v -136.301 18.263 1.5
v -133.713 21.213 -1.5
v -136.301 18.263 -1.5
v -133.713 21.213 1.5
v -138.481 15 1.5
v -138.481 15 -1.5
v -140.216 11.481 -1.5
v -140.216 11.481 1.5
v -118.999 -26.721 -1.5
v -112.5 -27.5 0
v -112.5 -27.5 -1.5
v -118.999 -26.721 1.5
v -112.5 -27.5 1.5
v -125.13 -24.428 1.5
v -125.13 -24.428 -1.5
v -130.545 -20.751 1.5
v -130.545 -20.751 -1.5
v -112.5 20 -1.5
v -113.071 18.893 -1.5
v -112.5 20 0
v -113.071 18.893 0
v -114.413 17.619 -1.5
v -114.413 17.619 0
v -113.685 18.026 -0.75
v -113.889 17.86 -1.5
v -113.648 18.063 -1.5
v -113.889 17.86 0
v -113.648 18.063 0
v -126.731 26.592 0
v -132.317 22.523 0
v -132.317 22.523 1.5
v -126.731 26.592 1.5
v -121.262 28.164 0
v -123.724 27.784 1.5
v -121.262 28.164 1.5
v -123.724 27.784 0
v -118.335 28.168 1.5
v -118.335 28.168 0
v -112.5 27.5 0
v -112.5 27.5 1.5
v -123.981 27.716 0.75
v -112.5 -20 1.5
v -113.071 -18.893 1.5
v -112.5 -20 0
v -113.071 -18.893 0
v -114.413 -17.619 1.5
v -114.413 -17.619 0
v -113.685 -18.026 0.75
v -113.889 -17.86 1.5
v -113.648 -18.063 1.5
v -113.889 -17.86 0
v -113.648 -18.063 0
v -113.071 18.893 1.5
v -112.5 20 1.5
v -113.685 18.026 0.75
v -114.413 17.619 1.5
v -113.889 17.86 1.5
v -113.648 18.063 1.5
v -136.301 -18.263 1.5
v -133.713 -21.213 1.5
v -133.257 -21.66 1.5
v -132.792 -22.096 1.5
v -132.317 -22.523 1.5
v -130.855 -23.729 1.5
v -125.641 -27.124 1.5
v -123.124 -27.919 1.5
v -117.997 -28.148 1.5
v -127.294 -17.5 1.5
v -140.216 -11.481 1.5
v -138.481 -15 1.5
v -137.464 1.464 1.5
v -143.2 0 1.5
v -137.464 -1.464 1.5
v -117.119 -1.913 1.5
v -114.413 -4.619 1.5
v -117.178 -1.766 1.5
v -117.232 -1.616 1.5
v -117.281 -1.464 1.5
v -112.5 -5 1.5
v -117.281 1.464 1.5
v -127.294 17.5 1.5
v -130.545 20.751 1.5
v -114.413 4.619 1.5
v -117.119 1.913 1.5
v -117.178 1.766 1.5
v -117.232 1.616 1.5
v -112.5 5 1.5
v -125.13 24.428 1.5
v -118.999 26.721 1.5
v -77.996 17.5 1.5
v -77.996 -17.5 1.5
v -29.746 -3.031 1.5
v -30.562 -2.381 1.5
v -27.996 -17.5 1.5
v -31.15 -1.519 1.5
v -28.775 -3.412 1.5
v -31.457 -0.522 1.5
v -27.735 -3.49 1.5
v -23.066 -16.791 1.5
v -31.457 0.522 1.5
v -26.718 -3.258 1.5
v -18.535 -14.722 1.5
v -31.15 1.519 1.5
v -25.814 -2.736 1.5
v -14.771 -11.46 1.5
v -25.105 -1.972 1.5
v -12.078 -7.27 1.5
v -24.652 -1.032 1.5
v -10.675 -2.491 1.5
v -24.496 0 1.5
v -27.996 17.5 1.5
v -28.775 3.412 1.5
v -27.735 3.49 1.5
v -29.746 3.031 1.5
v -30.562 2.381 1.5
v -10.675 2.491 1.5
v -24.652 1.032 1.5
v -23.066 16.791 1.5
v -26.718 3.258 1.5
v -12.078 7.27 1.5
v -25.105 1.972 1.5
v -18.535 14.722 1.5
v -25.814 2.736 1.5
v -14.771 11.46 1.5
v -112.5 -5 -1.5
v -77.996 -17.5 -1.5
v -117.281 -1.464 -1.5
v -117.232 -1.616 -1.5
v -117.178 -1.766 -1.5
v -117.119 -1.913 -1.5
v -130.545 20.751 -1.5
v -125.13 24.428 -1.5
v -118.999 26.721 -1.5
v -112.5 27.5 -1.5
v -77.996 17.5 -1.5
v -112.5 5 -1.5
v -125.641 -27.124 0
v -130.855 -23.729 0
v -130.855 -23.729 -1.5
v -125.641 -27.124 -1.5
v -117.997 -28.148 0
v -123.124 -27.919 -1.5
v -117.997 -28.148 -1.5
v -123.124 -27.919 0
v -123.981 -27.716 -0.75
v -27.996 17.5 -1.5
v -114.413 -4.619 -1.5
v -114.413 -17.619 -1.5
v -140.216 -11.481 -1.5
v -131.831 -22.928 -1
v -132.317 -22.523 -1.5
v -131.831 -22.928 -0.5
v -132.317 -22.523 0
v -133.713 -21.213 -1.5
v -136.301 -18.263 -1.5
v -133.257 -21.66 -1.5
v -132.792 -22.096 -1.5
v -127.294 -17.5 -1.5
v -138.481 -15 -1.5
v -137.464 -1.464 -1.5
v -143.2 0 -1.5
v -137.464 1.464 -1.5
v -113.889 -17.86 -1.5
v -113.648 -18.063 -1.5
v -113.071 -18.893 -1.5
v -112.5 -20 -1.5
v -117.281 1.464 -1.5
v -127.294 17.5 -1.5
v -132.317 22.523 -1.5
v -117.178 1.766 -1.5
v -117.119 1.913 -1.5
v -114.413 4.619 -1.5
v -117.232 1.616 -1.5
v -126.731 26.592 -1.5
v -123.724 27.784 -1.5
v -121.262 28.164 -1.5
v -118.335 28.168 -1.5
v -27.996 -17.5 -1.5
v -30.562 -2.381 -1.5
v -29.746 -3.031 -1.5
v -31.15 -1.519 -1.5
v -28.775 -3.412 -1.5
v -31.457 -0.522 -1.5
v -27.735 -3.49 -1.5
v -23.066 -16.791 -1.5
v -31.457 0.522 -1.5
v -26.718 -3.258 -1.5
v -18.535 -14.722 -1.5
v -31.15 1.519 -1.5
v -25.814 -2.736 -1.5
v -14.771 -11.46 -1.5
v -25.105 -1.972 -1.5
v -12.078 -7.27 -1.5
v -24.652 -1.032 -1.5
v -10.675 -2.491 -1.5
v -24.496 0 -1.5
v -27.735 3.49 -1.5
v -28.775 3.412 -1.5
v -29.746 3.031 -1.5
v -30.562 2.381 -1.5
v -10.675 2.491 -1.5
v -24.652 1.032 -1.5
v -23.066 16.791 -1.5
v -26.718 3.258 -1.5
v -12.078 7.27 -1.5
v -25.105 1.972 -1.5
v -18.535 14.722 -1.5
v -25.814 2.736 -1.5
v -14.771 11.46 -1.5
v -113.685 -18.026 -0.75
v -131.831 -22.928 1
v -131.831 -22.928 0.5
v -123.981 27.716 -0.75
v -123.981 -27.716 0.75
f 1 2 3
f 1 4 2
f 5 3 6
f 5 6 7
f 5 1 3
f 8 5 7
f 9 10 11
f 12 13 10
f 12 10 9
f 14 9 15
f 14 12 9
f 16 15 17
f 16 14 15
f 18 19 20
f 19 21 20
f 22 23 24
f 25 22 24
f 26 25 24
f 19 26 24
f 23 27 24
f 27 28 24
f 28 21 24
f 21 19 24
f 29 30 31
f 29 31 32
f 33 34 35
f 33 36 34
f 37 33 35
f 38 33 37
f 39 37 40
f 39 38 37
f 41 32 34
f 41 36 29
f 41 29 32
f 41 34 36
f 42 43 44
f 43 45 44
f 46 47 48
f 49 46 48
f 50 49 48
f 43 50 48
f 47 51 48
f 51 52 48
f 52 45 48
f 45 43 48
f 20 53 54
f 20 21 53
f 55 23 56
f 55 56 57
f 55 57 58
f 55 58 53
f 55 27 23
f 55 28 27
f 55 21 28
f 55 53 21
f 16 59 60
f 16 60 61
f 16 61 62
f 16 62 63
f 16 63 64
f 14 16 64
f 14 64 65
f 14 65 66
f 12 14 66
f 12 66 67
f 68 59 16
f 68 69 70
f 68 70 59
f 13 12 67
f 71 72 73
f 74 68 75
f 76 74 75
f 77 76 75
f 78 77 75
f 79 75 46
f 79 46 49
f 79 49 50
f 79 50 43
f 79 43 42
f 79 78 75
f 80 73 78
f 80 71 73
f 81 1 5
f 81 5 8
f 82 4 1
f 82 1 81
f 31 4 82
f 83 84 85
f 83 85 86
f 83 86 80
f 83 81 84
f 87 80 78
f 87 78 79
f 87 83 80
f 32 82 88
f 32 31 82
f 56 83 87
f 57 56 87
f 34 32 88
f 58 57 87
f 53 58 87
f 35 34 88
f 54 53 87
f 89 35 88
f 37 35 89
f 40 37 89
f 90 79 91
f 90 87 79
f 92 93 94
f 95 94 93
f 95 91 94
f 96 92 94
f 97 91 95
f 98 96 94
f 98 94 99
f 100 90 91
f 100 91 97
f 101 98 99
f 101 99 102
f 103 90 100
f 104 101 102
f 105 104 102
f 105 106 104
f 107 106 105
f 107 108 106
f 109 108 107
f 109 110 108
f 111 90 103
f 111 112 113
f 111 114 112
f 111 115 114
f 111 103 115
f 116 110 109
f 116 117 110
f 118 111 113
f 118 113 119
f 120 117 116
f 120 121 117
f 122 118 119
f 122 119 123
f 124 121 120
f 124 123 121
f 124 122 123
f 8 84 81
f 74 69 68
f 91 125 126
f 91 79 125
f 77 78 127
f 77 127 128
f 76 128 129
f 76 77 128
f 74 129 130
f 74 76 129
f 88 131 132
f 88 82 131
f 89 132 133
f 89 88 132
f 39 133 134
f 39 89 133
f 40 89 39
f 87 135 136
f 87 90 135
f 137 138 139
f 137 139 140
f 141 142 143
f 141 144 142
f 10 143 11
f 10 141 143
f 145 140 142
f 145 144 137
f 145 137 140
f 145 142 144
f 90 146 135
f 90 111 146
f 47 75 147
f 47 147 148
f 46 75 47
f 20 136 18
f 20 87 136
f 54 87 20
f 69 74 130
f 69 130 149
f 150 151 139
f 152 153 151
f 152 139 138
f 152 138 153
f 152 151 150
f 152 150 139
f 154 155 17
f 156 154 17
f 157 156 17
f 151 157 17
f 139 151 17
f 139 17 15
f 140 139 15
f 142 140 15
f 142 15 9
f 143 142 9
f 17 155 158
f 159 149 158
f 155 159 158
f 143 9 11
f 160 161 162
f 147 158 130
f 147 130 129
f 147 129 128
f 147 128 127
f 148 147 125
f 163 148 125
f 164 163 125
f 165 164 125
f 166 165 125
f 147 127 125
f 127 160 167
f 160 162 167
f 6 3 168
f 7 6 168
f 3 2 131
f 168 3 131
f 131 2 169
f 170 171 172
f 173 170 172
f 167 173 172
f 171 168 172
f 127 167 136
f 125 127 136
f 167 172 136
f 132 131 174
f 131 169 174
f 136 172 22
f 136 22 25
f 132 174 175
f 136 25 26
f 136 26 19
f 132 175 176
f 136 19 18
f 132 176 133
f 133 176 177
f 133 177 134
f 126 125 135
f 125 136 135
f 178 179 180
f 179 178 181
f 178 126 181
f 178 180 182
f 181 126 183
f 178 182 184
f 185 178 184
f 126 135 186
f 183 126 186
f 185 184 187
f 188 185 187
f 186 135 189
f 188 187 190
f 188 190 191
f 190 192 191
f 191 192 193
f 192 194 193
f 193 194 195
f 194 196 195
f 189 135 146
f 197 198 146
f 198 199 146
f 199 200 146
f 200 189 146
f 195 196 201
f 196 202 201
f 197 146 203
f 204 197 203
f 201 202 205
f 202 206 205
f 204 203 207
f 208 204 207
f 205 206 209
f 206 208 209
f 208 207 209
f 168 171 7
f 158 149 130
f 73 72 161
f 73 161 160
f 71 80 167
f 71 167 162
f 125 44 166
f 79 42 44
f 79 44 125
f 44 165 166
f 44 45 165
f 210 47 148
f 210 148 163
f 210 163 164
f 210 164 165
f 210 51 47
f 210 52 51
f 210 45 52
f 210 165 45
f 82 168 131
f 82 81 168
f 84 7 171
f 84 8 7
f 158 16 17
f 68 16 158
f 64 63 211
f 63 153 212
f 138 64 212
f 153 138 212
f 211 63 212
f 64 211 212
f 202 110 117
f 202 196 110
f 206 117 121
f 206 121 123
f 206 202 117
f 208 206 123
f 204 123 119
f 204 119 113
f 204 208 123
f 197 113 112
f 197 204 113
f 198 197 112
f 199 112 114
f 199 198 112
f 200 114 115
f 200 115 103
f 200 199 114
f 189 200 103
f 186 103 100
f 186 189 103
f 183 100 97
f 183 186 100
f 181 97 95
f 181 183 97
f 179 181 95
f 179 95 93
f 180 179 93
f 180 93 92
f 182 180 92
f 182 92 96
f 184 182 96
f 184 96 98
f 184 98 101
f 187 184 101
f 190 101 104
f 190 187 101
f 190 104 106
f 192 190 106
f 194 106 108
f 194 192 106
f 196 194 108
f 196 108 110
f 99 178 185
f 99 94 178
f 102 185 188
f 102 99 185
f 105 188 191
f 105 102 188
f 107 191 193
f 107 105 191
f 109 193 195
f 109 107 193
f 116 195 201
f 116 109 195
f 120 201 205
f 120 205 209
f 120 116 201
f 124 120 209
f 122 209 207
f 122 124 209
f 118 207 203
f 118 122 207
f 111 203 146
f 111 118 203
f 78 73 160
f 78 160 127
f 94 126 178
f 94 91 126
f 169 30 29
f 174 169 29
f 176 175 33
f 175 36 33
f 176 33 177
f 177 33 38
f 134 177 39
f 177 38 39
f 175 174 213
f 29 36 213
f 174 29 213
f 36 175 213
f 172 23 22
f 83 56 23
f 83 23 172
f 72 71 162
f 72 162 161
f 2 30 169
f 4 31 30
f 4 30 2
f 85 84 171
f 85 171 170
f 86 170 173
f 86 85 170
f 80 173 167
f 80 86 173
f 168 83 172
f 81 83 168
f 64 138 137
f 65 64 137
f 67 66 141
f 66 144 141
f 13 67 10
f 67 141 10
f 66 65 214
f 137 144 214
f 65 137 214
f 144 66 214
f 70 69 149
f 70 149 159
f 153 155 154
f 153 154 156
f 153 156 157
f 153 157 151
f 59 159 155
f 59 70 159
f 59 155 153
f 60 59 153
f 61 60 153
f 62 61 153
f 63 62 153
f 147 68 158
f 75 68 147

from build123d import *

# Parameters (mm, degrees)
F0_R     = 3.5
F1_DEPTH = 1.5


# Not quite as in the source:
# - a feature names something its author has since deleted; it is built from what else it names


with BuildPart() as f1:
    # F0 (on Top) → F1 (new body, symmetric)
    with BuildSketch(Plane.XY):
        with BuildLine():
            Line((-140.2163859753, 11.480502971), (-117.1193976626, 1.9134171618))
            ThreePointArc((-117.1193976626, 1.9134171618), (-117.2054191616, 1.6908667936), (-117.2807257879, 1.4644660941))
            Line((-117.2807257879, 1.4644660941), (-135.5639451435, 1.4644660941))
            Line((-135.5639451435, 1.4644660941), (-137.4212426417, 1.4644660941))
            Line((-137.4212426417, 1.4644660941), (-137.4642343313, 1.4644660941))
            Line((-137.4642343313, 1.4644660941), (-143.2, 0))
            Line((-143.2, 0), (-137.4642343313, -1.4644660941))
            Line((-137.4642343313, -1.4644660941), (-137.4212426417, -1.4644660941))
            Line((-137.4212426417, -1.4644660941), (-135.5639451435, -1.4644660941))
            Line((-135.5639451435, -1.4644660941), (-117.2807257879, -1.4644660941))
            ThreePointArc((-117.2807257879, -1.4644660941), (-117.2054191616, -1.6908667936), (-117.1193976626, -1.9134171618))
            Line((-117.1193976626, -1.9134171618), (-140.2163859753, -11.480502971))
            ThreePointArc((-140.2163859753, -11.480502971), (-137.4440883691, -16.6671069906), (-133.7132034356, -21.2132034356))
            ThreePointArc((-133.7132034356, -21.2132034356), (-133.0255631487, -21.8792426155), (-132.3170219693, -22.5230024701))
            add(Edge.make_bspline(
                [(-132.3170219693, -22.5230024701), (-131.8310141521, -22.9279318204), (-131.3450063349, -23.3328611708), (-130.8554027807, -23.7292896809)],
                knots=[0, 0, 0, 0, 0.0899480821, 0.0899480821, 0.0899480821, 0.0899480821], degree=3))
            add(Edge.make_bspline(
                [(-130.8554027807, -23.7292896809), (-128.7296529668, -25.4504941622), (-123.6181233569, -29.0879440293), (-116.5404183436, -28.0770720452), (-112.5, -27.5)],
                knots=[0.0899480821, 0.0899480821, 0.0899480821, 0.0899480821, 0.4804826627, 1, 1, 1, 1], degree=3))
            ThreePointArc((-112.5, -27.5), (-122.1329967473, -25.7576274852), (-130.5453194023, -20.7512999031))
            Line((-130.5453194023, -20.7512999031), (-127.2940194993, -17.5))
            Line((-127.2940194993, -17.5), (-114.4134171618, -4.6193976626))
            Line((-114.4134171618, -4.6193976626), (-114.4134171618, -17.6193976626))
            add(Edge.make_bspline(
                [(-114.4134171618, -17.6193976626), (-114.1696893018, -17.7059100784), (-113.5209993488, -17.936165803), (-112.89241231, -19.2067830939), (-112.5, -20)],
                knots=[0, 0, 0, 0, 0.3757231924, 1, 1, 1, 1], degree=3))
            Line((-112.5, -20), (-112.5, -5))
            Line((-112.5, -5), (-77.9963913669, -17.5))
            Line((-77.9963913669, -17.5), (-27.9963913669, -17.5))
            ThreePointArc((-27.9963913669, -17.5), (-10.4963913669, 0), (-27.9963913669, 17.5))
            Line((-27.9963913669, 17.5), (-77.9963913669, 17.5))
            Line((-77.9963913669, 17.5), (-112.5, 5))
            Line((-112.5, 5), (-112.5, 20))
            add(Edge.make_bspline(
                [(-114.4134171618, 17.6193976626), (-114.1696893018, 17.7059100784), (-113.5209993488, 17.936165803), (-112.89241231, 19.2067830939), (-112.5, 20)],
                knots=[0, 0, 0, 0, 0.3757231924, 1, 1, 1, 1], degree=3))
            Line((-114.4134171618, 17.6193976626), (-114.4134171618, 4.6193976626))
            Line((-114.4134171618, 4.6193976626), (-127.2940194993, 17.5))
            Line((-127.2940194993, 17.5), (-130.5453194023, 20.7512999031))
            ThreePointArc((-130.5453194023, 20.7512999031), (-122.1329967473, 25.7576274852), (-112.5, 27.5))
            add(Edge.make_bspline(
                [(-132.3170219693, 22.5230024701), (-129.7208762292, 24.6860450606), (-124.3176724473, 29.1878570062), (-116.5404183436, 28.0770720452), (-112.5, 27.5)],
                knots=[0, 0, 0, 0, 0.4804826627, 1, 1, 1, 1], degree=3))
            Line((-132.3170219693, 22.5230024701), (-133.7132034356, 21.2132034356))
            ThreePointArc((-133.7132034356, 21.2132034356), (-137.4440883691, 16.6671069906), (-140.2163859753, 11.480502971))
        make_face()
        with Locations((-27.9963913669, 0)):
            Circle(F0_R, mode=Mode.SUBTRACT)
    extrude(amount=F1_DEPTH, both=True)


solid = f1.part
